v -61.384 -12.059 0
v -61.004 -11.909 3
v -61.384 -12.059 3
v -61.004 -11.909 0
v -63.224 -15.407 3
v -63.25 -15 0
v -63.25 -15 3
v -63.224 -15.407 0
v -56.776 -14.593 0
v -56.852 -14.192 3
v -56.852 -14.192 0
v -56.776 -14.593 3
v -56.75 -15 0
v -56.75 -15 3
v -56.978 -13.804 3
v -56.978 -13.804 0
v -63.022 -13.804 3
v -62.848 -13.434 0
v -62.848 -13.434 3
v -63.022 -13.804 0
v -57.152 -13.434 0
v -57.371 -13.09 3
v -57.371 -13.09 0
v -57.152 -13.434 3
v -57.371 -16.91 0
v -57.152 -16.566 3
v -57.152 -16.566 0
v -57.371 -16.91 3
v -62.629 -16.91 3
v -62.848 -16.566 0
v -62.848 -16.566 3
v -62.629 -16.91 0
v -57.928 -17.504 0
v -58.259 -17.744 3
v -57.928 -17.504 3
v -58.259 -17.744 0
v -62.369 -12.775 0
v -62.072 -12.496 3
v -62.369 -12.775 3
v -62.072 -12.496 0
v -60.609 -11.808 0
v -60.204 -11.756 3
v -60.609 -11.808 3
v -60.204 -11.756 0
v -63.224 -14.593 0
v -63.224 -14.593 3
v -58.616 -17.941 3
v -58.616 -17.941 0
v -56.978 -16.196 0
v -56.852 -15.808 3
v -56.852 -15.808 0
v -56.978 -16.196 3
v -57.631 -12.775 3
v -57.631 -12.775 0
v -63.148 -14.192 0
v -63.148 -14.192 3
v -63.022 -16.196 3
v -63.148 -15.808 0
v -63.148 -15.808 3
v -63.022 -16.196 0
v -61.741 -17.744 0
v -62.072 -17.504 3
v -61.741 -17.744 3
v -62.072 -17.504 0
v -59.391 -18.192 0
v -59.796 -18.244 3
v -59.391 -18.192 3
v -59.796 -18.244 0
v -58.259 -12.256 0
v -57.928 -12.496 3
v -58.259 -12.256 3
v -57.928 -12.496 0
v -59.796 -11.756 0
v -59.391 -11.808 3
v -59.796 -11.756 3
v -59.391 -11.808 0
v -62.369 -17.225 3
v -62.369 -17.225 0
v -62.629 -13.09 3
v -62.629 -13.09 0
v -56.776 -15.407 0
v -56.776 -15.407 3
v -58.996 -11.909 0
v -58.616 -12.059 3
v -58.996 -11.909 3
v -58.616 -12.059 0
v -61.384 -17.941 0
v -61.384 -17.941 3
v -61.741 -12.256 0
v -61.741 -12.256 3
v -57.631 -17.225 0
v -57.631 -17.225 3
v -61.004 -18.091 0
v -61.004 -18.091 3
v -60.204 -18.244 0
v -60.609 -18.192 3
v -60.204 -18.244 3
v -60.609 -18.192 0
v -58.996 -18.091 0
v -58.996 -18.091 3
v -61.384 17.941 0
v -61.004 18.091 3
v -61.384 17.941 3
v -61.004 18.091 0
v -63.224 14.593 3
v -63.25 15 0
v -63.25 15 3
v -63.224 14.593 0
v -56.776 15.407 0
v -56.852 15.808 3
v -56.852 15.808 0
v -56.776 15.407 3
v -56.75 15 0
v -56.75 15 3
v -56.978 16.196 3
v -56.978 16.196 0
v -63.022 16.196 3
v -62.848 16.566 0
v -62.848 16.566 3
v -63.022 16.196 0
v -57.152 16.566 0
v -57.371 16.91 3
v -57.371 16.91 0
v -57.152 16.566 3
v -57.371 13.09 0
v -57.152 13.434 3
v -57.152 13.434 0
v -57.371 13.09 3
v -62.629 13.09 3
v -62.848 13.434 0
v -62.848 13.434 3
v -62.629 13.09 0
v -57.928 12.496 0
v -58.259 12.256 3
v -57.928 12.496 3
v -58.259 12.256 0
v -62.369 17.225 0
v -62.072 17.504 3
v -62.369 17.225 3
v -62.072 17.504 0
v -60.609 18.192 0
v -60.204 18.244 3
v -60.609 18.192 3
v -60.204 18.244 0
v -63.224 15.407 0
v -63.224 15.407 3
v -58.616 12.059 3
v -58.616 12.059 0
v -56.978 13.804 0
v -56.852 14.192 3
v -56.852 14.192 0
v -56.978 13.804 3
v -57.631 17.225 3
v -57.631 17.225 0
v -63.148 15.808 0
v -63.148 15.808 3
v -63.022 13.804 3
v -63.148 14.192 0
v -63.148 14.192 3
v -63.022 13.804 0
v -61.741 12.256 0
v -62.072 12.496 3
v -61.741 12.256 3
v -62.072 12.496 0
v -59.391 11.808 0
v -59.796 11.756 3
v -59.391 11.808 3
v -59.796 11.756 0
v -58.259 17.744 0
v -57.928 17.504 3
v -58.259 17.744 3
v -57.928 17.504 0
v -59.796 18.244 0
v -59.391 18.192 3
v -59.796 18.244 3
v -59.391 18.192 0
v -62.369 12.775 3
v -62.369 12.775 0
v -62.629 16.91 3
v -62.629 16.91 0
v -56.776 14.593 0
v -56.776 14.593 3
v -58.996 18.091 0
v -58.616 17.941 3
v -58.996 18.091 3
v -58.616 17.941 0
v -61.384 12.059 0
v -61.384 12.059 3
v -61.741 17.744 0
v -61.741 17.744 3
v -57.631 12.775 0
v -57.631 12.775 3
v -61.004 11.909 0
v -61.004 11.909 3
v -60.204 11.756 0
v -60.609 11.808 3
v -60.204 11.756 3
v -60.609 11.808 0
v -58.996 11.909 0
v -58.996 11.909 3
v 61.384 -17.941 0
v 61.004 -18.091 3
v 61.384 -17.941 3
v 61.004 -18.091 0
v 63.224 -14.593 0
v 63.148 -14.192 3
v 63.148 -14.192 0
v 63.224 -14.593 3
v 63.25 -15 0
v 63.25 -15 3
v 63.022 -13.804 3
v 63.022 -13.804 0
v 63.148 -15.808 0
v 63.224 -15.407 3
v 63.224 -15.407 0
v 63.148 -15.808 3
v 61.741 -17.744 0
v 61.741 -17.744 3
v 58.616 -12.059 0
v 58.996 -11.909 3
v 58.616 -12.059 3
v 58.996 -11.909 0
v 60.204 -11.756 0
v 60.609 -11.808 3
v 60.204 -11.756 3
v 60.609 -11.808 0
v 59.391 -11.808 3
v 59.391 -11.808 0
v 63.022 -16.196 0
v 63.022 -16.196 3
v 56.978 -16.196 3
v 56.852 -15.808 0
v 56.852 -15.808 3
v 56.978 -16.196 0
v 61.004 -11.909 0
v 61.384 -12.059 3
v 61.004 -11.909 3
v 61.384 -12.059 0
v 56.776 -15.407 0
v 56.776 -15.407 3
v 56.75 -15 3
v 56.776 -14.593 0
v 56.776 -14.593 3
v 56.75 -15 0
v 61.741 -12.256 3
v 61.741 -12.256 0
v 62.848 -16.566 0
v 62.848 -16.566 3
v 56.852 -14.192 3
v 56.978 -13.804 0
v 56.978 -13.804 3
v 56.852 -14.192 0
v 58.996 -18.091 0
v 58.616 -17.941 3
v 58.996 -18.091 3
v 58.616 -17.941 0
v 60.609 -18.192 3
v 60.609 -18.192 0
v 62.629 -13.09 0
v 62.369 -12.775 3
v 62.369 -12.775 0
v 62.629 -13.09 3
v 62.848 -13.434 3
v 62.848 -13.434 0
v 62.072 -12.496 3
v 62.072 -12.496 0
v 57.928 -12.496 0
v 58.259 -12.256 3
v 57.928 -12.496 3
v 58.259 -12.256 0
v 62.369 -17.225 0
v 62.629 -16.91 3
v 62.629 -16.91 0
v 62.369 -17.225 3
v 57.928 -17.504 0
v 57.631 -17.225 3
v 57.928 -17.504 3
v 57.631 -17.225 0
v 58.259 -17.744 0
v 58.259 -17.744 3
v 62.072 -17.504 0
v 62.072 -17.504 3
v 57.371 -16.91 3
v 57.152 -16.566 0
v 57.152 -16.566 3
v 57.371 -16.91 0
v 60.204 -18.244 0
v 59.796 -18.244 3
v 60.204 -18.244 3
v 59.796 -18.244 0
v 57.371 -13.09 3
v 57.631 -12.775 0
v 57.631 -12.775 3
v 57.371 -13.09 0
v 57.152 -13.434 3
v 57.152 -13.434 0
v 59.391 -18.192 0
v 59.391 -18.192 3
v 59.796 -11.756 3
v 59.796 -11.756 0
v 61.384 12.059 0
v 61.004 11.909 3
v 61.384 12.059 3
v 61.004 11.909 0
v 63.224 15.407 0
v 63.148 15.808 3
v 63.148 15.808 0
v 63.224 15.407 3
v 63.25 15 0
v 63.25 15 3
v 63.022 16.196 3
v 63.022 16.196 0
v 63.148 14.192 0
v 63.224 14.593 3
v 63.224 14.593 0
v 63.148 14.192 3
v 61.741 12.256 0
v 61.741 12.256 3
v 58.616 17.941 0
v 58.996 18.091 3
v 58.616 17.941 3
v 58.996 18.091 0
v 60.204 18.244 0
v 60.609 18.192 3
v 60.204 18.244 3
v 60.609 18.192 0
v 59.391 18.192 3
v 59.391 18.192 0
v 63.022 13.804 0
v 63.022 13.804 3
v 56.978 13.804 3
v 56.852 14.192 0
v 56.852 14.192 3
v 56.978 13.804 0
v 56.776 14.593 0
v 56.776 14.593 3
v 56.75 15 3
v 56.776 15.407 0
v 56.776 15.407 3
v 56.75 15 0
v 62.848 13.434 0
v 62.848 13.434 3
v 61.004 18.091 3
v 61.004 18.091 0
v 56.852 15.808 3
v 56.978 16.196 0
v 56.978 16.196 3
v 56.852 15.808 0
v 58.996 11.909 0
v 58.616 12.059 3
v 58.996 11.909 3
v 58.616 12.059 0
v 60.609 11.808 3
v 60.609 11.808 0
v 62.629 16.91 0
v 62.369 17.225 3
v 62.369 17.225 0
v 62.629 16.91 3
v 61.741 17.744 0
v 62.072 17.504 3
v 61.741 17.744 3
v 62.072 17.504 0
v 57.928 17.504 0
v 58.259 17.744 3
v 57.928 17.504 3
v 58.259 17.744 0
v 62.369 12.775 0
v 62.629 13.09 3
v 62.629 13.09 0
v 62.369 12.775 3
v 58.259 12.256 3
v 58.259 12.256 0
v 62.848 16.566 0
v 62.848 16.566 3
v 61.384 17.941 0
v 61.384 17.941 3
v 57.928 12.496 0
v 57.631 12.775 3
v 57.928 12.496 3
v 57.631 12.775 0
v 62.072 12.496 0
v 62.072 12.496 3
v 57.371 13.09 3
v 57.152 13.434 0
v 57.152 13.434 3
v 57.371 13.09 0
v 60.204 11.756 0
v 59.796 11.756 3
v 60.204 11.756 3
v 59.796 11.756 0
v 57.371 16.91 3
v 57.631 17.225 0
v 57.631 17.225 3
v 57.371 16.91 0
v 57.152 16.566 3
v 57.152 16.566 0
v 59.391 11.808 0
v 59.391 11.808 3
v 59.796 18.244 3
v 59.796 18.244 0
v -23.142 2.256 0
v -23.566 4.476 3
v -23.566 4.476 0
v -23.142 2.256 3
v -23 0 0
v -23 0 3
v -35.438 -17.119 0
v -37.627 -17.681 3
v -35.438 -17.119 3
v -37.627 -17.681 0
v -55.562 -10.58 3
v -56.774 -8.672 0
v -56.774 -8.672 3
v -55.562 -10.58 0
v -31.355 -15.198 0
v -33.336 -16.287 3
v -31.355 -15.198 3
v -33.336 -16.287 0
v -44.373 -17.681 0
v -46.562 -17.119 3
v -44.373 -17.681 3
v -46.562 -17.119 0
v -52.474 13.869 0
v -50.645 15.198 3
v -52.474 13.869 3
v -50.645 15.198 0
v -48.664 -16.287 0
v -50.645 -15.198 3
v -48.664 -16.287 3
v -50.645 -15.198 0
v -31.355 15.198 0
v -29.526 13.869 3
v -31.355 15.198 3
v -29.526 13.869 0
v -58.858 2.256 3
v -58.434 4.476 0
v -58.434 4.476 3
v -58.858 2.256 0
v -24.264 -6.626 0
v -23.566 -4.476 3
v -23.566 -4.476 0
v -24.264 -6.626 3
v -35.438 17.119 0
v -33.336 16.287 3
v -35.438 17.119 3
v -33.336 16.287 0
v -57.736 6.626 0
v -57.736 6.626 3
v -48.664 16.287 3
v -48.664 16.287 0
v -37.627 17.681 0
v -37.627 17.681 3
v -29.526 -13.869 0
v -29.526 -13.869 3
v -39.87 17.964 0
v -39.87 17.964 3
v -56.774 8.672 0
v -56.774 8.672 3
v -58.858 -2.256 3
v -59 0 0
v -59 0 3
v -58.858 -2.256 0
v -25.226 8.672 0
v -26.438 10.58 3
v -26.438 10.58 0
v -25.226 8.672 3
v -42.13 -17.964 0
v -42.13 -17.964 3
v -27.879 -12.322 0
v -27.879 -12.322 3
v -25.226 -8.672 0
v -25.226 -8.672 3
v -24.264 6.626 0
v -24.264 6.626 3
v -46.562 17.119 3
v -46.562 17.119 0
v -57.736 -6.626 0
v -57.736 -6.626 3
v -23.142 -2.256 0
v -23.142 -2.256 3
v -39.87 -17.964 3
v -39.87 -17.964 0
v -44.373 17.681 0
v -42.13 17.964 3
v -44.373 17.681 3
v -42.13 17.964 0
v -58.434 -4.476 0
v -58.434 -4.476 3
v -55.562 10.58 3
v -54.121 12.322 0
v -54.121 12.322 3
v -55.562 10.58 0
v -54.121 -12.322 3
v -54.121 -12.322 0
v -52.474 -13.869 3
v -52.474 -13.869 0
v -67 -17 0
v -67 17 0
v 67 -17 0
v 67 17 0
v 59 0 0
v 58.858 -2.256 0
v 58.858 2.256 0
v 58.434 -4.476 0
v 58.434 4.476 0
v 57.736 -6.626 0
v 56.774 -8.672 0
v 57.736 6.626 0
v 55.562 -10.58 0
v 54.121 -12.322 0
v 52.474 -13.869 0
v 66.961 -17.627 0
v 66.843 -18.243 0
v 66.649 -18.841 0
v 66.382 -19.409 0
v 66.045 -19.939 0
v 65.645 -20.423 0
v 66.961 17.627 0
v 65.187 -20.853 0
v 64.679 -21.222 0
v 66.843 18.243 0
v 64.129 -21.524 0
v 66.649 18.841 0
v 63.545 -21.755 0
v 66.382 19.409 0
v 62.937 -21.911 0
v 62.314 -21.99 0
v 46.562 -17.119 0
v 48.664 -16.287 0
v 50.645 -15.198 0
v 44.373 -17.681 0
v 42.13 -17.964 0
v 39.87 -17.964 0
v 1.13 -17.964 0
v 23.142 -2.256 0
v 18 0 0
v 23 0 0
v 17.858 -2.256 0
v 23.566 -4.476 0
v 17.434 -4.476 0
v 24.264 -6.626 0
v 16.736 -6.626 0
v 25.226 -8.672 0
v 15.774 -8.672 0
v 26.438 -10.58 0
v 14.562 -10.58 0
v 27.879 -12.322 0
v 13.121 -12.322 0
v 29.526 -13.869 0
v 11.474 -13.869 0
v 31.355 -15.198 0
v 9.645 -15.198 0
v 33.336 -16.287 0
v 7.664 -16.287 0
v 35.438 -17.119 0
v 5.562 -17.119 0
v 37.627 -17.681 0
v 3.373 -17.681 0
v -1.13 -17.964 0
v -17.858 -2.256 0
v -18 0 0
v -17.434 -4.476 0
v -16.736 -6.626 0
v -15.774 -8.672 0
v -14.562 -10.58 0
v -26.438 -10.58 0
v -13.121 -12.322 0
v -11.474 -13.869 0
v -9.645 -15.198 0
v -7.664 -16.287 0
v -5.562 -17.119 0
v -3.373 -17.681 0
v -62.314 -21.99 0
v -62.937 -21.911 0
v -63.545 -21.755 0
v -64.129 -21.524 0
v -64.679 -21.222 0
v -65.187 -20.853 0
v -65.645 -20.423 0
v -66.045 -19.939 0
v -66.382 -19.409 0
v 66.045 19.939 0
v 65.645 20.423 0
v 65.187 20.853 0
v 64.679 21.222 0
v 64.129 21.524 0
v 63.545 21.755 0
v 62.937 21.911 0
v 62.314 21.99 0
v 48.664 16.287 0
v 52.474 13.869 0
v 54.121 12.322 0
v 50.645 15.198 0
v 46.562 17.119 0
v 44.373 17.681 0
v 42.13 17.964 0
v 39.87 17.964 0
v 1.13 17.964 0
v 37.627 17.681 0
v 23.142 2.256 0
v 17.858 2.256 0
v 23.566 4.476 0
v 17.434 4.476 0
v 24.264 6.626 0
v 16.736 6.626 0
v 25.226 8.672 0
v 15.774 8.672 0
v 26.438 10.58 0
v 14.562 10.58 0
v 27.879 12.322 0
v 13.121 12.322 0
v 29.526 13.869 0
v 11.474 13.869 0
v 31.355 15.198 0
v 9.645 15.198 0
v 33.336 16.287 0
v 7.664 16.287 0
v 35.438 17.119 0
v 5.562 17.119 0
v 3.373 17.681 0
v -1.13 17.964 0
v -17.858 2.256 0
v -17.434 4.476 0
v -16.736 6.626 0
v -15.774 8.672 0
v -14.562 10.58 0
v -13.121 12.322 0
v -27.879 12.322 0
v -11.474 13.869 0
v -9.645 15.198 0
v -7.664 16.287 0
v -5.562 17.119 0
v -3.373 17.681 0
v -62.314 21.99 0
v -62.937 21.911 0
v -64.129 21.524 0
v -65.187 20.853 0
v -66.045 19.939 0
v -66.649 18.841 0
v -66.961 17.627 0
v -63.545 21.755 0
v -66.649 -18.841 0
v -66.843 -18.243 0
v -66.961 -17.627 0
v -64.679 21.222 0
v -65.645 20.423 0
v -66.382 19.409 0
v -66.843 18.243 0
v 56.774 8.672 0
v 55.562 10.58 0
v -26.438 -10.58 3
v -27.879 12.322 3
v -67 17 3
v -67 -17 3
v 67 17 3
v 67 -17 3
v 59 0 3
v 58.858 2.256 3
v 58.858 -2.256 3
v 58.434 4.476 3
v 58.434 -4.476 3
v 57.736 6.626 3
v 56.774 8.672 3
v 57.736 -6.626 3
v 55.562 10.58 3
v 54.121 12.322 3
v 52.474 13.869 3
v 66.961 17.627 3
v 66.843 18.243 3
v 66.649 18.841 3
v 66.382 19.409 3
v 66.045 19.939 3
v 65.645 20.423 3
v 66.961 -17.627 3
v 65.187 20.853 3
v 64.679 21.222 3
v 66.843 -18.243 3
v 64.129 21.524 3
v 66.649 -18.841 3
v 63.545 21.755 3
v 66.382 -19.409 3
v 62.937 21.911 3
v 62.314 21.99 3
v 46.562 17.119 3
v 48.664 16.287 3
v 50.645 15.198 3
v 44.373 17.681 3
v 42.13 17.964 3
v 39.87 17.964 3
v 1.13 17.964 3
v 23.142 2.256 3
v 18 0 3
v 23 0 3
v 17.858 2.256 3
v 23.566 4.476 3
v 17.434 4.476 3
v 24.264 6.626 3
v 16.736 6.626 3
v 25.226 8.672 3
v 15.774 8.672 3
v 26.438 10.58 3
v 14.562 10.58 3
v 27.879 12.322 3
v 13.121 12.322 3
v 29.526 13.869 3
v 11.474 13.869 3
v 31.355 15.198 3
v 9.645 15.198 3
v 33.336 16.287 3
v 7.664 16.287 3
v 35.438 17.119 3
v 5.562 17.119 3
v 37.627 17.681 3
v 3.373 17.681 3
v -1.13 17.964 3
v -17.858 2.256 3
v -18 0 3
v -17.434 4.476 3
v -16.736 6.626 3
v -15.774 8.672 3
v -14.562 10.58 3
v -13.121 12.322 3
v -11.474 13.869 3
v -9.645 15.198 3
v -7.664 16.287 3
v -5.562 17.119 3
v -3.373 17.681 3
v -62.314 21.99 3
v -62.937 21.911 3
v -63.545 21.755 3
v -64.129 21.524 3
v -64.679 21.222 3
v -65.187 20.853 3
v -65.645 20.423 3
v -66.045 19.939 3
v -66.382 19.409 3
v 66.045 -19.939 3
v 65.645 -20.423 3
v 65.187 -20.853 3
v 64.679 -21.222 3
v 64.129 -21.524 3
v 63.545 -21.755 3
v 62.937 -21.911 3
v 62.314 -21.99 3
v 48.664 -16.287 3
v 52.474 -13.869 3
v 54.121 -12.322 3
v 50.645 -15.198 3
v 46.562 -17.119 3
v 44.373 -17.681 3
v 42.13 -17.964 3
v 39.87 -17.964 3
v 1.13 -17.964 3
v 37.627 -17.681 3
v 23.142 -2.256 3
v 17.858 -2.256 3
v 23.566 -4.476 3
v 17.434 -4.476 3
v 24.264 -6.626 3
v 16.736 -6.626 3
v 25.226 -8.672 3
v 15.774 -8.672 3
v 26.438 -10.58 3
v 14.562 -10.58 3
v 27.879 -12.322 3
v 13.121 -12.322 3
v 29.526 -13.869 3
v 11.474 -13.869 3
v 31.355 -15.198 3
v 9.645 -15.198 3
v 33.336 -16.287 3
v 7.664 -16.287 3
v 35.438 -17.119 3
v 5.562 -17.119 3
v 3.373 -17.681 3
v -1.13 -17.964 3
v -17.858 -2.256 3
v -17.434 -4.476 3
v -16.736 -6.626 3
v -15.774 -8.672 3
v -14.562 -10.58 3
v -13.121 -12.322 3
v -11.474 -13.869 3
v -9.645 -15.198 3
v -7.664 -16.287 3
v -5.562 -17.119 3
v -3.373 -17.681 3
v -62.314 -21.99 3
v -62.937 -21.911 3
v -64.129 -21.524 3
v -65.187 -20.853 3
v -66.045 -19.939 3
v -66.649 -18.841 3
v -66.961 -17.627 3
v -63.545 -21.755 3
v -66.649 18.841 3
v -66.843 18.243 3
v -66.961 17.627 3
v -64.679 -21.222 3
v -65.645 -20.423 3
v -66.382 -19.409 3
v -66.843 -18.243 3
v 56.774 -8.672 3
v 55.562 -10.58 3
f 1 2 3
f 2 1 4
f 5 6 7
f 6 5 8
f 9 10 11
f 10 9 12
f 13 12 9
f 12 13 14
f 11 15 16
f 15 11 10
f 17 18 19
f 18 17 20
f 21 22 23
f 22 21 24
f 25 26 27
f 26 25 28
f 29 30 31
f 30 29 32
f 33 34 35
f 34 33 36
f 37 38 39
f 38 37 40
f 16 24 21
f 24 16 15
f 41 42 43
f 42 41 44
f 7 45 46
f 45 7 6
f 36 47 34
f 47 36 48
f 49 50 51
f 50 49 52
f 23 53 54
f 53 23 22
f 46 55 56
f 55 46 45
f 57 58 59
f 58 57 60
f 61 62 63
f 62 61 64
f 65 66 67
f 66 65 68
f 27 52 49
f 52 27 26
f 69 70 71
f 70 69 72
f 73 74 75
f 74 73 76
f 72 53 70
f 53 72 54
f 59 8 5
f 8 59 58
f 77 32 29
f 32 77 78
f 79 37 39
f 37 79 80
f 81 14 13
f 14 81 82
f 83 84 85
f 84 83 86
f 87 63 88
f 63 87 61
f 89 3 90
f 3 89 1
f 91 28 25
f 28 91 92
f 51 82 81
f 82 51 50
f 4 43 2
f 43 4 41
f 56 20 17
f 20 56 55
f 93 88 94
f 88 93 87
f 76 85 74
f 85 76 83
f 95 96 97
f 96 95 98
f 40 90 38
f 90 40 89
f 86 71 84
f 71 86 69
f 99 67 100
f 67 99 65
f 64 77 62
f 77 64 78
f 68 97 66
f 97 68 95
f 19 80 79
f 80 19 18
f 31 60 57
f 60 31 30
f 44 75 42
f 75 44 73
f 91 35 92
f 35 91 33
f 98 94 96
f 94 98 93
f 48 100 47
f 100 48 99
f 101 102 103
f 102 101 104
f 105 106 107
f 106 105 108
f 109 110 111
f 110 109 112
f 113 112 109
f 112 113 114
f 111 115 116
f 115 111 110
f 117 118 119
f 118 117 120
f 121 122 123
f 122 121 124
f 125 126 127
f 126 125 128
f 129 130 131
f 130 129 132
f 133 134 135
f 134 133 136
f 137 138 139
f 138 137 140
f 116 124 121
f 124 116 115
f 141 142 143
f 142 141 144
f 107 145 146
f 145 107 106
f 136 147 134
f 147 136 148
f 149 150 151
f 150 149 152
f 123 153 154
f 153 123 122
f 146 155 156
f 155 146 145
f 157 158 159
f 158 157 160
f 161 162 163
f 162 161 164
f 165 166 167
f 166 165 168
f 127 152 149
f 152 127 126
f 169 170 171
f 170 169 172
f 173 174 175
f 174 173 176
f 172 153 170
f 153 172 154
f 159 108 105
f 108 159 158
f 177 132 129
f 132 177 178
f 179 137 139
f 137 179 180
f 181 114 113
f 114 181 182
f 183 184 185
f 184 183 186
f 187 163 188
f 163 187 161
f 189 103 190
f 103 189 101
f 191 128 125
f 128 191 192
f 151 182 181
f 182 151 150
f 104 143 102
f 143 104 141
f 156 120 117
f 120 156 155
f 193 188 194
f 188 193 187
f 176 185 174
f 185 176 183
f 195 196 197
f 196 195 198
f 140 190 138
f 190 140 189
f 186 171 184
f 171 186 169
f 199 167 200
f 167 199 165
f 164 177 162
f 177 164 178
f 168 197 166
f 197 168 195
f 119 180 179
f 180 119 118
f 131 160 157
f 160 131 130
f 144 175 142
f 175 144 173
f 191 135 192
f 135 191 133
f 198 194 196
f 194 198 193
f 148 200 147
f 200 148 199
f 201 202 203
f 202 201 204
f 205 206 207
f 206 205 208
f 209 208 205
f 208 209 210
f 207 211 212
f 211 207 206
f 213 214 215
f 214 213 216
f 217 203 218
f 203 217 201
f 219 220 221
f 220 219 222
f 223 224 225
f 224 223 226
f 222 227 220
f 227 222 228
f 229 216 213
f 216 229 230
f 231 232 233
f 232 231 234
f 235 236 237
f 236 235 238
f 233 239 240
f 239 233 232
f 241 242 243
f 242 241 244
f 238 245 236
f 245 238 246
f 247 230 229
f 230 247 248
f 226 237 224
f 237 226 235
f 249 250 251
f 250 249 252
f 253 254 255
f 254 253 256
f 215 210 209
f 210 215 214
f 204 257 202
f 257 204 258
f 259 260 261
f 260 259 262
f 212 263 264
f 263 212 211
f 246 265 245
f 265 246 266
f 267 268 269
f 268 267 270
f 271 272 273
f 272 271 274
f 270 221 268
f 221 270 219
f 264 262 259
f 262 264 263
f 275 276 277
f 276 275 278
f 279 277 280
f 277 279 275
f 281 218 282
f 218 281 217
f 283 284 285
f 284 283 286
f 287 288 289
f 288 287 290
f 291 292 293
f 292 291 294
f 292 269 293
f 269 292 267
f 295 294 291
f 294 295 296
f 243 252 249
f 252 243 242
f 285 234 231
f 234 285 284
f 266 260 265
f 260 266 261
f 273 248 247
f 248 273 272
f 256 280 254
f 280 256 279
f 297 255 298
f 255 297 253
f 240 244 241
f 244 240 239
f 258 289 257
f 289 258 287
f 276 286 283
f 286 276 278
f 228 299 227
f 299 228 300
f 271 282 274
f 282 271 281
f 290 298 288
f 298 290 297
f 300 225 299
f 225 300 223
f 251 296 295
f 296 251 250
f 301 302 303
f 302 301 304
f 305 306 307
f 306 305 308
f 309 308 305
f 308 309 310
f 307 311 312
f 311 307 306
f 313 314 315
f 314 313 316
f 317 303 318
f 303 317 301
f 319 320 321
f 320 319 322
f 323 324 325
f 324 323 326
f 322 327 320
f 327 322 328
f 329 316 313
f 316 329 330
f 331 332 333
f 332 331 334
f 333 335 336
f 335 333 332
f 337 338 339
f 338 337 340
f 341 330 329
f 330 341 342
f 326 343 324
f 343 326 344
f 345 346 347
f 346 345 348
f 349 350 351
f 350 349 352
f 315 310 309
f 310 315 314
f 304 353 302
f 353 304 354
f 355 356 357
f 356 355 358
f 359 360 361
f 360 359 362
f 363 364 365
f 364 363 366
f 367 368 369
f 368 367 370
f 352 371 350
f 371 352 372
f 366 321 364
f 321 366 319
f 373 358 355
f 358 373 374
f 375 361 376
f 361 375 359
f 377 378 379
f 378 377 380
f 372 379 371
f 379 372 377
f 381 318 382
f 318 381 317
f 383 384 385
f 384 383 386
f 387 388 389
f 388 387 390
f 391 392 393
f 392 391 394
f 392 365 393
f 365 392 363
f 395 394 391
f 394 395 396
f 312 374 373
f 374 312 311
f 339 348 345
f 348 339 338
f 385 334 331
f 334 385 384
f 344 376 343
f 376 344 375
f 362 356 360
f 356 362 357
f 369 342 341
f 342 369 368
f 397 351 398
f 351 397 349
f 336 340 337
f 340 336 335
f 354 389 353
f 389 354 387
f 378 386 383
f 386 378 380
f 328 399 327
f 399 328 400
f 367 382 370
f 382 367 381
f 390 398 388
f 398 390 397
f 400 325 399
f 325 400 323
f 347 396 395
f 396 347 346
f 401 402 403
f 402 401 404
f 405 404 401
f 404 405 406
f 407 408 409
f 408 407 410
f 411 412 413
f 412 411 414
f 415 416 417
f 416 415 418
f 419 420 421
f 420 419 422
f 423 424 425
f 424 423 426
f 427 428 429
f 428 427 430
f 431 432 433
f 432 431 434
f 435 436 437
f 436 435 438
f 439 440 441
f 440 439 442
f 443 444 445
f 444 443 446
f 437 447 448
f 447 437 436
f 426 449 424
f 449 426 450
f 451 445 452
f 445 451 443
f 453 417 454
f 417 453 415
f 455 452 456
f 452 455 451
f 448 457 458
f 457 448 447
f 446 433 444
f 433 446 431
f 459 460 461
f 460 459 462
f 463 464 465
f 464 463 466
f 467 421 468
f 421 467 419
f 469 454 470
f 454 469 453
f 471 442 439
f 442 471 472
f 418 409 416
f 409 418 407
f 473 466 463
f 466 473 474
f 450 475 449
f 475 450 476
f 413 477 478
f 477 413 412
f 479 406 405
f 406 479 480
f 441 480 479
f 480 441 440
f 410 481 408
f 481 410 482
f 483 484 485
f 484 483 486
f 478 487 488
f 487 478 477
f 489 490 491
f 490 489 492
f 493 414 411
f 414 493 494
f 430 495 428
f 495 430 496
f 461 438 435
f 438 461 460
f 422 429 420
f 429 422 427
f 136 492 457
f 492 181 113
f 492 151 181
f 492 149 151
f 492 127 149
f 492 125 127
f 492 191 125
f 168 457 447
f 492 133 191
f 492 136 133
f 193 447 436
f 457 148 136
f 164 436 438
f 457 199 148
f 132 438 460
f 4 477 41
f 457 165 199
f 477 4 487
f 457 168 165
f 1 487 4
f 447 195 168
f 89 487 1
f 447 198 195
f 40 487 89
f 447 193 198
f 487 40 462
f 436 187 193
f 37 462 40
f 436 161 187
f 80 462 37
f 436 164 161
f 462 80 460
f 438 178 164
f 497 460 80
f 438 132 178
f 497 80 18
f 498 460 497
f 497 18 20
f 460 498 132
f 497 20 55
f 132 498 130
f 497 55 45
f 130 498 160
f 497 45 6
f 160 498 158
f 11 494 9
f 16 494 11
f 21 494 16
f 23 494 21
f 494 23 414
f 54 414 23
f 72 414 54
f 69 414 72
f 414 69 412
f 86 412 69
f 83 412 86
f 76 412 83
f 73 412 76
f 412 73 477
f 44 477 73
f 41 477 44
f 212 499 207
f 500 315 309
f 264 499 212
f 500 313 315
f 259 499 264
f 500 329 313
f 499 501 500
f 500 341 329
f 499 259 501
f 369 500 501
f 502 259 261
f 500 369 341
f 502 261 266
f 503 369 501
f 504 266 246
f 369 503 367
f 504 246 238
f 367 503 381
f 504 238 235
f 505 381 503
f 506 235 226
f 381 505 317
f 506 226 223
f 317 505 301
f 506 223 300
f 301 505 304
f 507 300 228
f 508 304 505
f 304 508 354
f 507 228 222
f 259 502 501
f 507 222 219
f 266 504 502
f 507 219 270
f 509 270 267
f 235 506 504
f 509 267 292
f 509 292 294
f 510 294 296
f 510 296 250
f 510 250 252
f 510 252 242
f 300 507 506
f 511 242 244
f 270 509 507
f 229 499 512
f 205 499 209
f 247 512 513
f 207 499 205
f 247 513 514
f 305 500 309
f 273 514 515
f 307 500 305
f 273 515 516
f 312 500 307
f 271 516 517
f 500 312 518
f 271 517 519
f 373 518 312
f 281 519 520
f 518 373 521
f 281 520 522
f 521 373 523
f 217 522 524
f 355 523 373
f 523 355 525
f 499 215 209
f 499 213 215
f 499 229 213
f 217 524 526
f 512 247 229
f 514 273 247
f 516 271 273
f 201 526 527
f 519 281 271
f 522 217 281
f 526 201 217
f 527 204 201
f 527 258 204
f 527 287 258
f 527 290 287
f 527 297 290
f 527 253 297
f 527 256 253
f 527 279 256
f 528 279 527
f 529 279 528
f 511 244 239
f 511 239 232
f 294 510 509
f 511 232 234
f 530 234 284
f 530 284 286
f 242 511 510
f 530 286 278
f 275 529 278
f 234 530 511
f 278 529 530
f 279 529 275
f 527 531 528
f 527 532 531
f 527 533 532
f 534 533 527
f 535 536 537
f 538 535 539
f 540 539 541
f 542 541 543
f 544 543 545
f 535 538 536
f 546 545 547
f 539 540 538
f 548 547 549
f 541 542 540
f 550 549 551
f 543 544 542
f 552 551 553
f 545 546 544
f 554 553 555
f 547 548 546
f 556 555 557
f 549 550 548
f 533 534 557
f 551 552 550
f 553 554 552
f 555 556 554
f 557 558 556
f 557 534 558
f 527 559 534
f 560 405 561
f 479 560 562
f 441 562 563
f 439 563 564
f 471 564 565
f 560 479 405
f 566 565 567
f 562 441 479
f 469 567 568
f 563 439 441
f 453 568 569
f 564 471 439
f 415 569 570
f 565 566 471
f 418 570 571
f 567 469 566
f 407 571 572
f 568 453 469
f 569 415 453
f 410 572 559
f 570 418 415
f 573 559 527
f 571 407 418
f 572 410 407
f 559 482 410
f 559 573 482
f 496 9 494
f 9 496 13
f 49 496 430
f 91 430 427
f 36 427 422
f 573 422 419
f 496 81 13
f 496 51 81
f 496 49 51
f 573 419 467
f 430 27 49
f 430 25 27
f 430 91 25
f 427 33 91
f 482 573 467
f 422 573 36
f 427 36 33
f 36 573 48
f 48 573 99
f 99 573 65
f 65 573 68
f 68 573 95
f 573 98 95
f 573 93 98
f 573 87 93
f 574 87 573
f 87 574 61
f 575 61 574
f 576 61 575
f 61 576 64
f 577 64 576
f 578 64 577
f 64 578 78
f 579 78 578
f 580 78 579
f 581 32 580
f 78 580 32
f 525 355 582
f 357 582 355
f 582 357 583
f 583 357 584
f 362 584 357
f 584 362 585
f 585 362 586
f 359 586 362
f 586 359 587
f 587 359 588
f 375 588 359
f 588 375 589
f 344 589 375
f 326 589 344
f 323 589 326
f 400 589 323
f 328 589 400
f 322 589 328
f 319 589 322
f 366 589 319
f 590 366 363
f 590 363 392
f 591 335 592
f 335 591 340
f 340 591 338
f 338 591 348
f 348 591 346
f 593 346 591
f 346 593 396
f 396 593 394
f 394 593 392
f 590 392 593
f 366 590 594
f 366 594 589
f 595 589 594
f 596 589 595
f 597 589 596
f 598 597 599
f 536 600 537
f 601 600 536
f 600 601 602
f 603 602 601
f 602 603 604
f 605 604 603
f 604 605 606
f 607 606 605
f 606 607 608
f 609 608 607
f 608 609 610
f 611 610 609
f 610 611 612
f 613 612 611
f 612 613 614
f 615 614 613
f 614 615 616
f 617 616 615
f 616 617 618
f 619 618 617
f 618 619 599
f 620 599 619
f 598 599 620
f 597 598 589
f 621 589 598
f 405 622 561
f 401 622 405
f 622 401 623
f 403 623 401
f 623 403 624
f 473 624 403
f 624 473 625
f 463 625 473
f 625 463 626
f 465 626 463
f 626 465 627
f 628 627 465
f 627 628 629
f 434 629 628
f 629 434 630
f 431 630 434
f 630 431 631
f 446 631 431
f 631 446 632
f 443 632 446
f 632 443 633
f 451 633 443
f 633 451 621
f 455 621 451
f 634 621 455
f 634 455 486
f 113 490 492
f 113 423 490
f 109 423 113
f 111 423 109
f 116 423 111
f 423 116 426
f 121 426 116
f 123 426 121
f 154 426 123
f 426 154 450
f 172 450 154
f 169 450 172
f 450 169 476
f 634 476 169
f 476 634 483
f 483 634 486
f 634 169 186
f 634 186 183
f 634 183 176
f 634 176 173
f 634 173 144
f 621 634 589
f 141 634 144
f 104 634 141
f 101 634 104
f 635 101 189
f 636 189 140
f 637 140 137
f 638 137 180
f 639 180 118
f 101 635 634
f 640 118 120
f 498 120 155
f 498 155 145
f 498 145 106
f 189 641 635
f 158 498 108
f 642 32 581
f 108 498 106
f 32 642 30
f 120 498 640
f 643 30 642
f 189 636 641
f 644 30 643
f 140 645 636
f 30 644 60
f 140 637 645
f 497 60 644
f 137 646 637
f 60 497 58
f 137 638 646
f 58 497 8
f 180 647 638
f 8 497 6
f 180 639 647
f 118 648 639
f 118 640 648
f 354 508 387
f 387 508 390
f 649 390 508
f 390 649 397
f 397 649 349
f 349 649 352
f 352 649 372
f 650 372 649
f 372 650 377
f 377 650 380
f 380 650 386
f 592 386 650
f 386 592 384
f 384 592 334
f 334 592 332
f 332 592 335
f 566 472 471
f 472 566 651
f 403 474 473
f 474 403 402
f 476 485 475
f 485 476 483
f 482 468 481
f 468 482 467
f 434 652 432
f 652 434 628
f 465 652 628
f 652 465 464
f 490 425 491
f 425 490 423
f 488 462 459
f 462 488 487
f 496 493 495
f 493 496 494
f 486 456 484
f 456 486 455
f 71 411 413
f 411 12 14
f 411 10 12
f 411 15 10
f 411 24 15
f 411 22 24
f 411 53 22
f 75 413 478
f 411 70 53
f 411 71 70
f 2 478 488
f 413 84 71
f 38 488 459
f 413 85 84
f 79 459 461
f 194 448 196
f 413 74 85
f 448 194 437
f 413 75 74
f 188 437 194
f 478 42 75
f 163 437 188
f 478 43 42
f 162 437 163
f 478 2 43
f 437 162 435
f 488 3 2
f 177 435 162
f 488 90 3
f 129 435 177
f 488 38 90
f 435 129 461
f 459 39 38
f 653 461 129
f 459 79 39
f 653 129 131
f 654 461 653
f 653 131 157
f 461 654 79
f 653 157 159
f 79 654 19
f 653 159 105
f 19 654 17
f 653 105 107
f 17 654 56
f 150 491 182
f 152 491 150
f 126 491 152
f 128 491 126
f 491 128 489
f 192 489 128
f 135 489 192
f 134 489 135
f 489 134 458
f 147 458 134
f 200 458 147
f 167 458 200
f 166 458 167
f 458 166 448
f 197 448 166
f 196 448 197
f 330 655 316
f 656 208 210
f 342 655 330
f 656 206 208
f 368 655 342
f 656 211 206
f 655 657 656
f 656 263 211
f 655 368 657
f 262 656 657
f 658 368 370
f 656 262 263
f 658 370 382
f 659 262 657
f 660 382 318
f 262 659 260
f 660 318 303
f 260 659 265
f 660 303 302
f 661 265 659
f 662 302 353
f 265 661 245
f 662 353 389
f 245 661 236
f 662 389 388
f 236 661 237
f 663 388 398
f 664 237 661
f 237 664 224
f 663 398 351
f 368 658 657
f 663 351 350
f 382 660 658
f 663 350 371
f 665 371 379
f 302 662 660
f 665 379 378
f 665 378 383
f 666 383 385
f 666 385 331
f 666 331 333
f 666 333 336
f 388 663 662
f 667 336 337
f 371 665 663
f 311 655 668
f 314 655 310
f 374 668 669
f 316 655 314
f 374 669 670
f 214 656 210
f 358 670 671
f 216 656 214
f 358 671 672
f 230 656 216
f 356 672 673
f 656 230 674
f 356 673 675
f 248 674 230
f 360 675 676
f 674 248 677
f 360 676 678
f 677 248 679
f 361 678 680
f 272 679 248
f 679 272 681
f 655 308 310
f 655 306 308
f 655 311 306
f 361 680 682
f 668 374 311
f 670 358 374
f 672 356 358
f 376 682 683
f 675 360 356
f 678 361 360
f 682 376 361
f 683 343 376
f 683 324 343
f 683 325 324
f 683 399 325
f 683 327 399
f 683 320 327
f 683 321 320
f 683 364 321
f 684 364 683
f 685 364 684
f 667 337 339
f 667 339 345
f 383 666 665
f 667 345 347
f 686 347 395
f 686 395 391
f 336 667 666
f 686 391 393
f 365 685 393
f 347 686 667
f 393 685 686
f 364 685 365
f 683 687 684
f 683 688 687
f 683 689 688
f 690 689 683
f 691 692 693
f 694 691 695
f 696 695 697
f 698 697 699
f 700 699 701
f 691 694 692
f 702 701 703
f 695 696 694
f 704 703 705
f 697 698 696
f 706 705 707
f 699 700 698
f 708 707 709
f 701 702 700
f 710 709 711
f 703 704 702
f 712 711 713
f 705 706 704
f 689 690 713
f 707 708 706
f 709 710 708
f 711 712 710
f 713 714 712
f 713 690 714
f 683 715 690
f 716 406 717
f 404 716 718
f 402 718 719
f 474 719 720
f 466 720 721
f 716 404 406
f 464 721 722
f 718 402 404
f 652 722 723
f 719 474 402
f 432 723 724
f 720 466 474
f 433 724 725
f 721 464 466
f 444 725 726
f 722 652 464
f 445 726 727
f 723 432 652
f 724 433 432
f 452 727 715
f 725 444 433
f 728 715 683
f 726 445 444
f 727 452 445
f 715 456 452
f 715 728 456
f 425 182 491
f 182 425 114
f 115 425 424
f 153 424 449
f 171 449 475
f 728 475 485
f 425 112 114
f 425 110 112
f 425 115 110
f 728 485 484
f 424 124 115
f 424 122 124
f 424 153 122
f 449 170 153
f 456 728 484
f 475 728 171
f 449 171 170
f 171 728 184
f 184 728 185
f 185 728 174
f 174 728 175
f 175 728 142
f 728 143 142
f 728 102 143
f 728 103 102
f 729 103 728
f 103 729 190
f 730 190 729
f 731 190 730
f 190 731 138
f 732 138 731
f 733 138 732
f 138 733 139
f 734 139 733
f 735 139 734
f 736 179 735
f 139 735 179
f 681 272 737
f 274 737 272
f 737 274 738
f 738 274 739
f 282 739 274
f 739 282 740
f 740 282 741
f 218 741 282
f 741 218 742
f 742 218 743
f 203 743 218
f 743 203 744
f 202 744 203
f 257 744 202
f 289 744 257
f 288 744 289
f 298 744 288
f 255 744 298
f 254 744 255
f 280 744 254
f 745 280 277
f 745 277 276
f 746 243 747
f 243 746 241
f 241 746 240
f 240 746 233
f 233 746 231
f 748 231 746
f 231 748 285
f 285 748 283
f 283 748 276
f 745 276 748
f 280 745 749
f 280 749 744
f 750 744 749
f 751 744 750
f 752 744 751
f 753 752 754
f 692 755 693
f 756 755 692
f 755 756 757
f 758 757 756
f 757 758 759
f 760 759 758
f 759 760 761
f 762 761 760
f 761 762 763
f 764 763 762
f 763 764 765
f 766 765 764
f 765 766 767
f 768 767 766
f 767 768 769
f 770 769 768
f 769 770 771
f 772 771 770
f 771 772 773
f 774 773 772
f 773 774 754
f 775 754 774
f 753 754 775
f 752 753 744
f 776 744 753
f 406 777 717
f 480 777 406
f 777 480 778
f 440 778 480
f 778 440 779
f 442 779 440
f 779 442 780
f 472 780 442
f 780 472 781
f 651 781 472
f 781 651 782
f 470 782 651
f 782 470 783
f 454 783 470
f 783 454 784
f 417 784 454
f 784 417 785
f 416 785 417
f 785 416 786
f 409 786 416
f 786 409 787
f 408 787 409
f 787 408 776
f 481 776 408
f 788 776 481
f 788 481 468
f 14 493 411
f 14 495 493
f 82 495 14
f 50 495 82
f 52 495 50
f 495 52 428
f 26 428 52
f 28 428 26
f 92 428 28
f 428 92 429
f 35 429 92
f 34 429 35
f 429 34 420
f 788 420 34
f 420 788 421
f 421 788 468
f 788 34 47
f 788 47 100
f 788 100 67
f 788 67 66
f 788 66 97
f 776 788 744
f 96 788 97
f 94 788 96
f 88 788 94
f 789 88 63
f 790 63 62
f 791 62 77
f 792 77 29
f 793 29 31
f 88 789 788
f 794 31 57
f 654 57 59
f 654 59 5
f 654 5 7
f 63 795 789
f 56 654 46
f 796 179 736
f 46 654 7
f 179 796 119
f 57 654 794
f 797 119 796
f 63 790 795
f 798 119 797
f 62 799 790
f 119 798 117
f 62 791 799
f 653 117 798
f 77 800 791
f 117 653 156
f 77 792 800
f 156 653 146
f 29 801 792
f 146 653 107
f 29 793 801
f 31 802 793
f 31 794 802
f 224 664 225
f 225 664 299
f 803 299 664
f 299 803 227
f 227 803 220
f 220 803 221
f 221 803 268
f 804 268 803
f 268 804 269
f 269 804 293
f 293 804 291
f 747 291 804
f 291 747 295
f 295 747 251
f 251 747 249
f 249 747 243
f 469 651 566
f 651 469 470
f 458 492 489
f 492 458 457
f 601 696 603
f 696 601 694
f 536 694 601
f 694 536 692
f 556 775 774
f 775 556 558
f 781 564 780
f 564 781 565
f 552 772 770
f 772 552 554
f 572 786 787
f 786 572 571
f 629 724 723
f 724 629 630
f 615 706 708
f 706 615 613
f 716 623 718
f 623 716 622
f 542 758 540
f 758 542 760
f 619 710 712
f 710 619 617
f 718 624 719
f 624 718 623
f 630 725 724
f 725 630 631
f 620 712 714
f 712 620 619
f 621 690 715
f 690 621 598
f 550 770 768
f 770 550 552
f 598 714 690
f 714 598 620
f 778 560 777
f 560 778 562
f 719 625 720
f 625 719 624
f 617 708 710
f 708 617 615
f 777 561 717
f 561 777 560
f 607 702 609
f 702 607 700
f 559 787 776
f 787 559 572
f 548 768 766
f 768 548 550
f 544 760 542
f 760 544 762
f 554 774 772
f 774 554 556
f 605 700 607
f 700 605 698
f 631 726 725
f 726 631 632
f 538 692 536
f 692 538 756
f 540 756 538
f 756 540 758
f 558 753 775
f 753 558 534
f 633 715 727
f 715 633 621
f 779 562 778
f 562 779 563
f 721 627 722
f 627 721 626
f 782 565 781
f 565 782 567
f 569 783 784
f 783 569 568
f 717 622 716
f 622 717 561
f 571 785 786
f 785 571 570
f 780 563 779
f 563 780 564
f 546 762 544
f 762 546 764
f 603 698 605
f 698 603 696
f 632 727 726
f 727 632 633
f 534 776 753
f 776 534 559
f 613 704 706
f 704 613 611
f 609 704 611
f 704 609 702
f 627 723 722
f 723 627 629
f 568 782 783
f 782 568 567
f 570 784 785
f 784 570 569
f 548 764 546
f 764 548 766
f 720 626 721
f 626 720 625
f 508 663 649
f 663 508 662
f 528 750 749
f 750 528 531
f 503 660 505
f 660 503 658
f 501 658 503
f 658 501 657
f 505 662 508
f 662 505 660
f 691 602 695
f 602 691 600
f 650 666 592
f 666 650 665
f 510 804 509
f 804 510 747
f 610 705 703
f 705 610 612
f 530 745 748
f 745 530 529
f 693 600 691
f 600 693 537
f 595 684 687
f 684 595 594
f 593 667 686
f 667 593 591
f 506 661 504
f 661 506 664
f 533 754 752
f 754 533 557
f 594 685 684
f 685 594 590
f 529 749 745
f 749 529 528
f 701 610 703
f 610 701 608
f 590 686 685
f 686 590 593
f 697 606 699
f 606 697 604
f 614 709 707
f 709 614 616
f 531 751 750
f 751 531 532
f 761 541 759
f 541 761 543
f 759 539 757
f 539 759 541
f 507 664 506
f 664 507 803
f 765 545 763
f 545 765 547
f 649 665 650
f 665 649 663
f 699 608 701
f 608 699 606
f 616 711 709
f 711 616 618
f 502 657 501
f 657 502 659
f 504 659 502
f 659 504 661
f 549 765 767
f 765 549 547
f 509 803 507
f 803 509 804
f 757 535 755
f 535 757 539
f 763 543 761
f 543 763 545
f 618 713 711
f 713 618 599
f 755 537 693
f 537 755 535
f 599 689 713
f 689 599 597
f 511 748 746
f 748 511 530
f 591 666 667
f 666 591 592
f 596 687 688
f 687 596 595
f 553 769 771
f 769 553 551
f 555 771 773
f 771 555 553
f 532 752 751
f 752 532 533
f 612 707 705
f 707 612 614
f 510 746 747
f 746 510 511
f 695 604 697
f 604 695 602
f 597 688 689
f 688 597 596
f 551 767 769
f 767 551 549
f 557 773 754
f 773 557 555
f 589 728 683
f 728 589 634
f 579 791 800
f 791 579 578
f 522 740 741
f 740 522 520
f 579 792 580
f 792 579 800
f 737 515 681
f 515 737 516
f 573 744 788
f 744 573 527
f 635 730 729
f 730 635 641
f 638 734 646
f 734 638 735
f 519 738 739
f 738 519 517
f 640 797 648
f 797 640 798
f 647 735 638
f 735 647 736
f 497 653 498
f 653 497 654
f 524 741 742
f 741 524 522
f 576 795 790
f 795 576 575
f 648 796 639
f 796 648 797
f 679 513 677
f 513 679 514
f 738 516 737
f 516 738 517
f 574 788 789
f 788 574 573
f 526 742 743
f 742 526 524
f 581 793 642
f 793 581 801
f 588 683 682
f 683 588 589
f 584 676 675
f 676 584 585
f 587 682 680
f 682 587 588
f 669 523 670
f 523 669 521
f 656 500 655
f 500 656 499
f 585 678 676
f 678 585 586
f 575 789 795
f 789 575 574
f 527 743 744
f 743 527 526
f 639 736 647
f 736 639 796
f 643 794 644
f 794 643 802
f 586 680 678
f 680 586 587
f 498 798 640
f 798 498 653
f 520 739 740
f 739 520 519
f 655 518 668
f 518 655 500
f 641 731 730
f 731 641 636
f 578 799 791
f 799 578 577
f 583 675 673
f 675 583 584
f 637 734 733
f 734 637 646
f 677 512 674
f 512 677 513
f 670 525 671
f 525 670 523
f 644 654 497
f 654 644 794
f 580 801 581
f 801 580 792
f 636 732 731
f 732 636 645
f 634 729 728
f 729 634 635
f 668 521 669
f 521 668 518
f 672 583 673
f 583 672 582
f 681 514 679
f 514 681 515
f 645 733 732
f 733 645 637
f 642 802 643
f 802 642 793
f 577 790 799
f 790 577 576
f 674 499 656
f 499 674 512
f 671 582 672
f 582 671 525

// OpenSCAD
$fn = 50;

difference() {
	union() {
		hull() {
			translate(v = [-62.0, 17.0, 0]) {
				cylinder(h = 3, r = 5);
			}
			translate(v = [62.0, 17.0, 0]) {
				cylinder(h = 3, r = 5);
			}
			translate(v = [-62.0, -17.0, 0]) {
				cylinder(h = 3, r = 5);
			}
			translate(v = [62.0, -17.0, 0]) {
				cylinder(h = 3, r = 5);
			}
		}
	}
	union() {
		translate(v = [-60.0, -15.0, -100.0]) {
			cylinder(h = 200, r = 3.25);
		}
		translate(v = [-60.0, 15.0, -100.0]) {
			cylinder(h = 200, r = 3.25);
		}
		translate(v = [60.0, -15.0, -100.0]) {
			cylinder(h = 200, r = 3.25);
		}
		translate(v = [60.0, 15.0, -100.0]) {
			cylinder(h = 200, r = 3.25);
		}
		translate(v = [-60.0, -15.0, -100.0]) {
			cylinder(h = 200, r = 1.8);
		}
		translate(v = [-60.0, 15.0, -100.0]) {
			cylinder(h = 200, r = 1.8);
		}
		translate(v = [60.0, -15.0, -100.0]) {
			cylinder(h = 200, r = 1.8);
		}
		translate(v = [60.0, 15.0, -100.0]) {
			cylinder(h = 200, r = 1.8);
		}
		translate(v = [-41.0, 0, 0.0]) {
			cylinder(h = 3, r = 18.0);
		}
		cylinder(h = 3, r = 18.0);
		translate(v = [41.0, 0, 0.0]) {
			cylinder(h = 3, r = 18.0);
		}
	}
}
